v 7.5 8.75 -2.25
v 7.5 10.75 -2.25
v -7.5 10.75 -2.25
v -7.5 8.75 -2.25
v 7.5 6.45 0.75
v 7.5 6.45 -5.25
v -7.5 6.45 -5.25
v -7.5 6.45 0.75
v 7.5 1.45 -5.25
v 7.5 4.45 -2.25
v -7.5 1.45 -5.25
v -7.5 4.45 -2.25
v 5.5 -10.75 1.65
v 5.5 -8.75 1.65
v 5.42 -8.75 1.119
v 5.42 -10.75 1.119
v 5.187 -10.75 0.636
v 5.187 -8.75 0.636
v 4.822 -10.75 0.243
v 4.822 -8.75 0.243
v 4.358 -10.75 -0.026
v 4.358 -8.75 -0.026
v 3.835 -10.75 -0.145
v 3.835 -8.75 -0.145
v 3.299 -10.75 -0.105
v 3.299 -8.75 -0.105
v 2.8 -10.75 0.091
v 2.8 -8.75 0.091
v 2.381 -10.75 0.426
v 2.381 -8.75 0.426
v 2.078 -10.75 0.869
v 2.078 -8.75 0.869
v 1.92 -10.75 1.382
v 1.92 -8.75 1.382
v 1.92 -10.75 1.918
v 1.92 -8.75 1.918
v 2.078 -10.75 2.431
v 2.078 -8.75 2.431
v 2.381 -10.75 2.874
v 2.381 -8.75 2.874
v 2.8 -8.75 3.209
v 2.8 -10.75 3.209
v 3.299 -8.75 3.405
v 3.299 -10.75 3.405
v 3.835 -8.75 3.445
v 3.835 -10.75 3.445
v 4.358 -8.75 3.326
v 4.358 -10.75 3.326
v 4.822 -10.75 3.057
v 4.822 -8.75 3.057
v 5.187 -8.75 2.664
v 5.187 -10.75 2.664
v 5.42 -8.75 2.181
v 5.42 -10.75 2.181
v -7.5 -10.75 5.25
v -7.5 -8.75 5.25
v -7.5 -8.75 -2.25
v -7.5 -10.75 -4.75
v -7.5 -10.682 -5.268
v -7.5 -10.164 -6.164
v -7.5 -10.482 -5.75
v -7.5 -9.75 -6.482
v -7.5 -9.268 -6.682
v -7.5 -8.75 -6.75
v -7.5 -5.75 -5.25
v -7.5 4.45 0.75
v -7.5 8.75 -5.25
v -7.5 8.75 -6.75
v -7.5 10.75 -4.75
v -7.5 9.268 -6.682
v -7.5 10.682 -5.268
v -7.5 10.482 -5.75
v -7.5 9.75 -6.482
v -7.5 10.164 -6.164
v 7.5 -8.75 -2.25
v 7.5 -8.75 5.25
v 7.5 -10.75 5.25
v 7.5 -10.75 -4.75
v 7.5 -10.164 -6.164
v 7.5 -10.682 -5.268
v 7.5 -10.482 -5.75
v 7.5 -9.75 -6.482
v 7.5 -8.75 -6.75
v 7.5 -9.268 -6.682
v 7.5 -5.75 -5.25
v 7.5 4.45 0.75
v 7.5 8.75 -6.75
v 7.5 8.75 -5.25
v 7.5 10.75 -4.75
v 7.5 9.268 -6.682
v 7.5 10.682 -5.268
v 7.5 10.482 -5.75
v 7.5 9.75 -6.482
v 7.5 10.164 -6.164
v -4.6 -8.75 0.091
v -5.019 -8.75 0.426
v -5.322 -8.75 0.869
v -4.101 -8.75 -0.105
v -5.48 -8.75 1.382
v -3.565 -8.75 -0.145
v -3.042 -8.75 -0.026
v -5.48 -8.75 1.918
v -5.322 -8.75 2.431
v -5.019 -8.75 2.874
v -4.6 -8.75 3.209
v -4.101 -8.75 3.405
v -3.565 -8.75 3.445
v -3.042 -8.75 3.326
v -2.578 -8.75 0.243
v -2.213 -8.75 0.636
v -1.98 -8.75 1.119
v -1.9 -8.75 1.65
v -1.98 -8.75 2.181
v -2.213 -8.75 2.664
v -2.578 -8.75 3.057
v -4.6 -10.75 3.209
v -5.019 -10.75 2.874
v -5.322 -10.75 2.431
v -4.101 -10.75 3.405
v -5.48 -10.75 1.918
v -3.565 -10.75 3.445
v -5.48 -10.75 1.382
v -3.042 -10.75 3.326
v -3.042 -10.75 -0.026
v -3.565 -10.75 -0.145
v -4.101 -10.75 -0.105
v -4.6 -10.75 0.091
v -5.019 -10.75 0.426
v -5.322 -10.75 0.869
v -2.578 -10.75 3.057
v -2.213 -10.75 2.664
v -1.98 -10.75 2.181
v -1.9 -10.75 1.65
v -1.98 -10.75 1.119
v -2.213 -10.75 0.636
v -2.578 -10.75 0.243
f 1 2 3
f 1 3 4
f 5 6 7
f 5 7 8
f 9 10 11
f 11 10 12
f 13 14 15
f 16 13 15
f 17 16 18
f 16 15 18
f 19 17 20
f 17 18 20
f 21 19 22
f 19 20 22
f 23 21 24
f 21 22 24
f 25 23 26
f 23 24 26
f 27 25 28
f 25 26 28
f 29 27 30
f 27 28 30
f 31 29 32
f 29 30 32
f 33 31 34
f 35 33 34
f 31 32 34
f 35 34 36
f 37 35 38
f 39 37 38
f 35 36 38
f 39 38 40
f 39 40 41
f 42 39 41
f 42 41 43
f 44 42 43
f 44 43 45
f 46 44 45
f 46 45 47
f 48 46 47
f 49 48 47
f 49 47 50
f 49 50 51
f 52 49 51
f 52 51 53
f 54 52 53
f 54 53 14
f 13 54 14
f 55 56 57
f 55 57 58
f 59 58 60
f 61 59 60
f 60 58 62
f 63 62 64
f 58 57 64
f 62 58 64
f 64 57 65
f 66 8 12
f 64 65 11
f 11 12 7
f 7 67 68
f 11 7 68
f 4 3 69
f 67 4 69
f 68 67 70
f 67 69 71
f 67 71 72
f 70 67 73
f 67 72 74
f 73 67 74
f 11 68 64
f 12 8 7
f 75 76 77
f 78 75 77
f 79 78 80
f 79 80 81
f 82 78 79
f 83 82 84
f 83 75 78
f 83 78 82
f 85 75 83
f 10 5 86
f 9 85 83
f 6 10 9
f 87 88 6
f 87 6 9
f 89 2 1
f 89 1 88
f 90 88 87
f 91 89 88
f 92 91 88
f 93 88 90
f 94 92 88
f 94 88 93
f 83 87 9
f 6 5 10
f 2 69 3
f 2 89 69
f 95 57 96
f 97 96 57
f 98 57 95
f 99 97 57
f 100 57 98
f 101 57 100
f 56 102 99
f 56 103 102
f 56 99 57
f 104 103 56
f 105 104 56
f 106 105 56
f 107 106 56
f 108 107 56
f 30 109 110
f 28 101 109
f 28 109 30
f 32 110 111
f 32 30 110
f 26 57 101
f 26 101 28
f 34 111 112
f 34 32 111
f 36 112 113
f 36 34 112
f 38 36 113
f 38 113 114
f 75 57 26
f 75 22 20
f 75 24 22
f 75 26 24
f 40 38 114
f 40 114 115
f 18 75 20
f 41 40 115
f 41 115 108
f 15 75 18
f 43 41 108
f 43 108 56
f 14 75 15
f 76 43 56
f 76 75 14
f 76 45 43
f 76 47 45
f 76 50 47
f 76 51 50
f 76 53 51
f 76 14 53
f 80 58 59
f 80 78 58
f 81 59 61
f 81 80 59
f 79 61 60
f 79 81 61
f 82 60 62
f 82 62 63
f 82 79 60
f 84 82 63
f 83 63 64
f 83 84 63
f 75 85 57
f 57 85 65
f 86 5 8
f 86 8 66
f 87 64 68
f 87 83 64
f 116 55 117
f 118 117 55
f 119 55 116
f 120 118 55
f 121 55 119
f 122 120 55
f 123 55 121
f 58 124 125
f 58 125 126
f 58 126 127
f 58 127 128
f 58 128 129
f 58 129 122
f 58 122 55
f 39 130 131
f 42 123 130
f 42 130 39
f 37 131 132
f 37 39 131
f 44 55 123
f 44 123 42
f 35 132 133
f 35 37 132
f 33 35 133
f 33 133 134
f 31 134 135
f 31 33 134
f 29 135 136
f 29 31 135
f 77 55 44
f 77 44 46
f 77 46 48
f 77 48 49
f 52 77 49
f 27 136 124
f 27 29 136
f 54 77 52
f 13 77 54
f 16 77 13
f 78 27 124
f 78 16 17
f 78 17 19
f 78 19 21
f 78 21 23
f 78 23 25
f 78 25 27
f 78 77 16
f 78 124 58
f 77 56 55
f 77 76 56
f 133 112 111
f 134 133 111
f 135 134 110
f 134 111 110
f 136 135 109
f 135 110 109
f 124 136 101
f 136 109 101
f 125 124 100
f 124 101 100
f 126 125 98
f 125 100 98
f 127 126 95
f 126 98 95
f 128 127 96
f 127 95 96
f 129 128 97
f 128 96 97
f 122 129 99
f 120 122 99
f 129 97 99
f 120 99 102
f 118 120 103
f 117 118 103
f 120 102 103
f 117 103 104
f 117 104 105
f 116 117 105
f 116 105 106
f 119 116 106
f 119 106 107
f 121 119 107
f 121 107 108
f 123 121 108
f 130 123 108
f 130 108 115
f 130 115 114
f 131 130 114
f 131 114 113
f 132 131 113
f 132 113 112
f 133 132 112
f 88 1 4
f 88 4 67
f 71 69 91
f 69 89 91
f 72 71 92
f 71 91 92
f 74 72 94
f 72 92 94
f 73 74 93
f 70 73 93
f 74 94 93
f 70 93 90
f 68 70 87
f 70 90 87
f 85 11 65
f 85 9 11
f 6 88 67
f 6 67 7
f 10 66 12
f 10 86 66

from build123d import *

# Parameters (mm, degrees)
BOSS_EXTRUDE1_DEPTH     = 7.5
CHAMFER1_SIZE           = 3
SKETCH2_R               = 1.8
CUT_EXTRUDE1_DEPTH      = 3
CUT_EXTRUDE1_DEPTH_BACK = 3
FILLET1_R               = 2


with BuildPart() as part:
    # Sketch1 → Boss-Extrude1 (new body, symmetric)
    with BuildSketch(Plane(origin=(0, 0, 0), x_dir=(0, 0, -1), z_dir=(1, 0, 0))):
        Polygon((-5.25, -8.75), (-5.25, -10.75), (6.75, -10.75), (6.75, 10.75), (2.25, 10.75), (2.25, 8.75), (5.25, 8.75), (5.25, 6.45), (-0.75, 6.45), (-0.75, 4.45), (5.25, 4.45), (5.25, -8.75), align=None)
    extrude(amount=BOSS_EXTRUDE1_DEPTH, both=True)

    # Chamfer1
    chamfer1_edges = [part.edges().sort_by_distance(p)[0] for p in [
        (0, -8.75, -5.25),
        (0, 4.45, -5.25),
    ]]
    chamfer(chamfer1_edges, length=CHAMFER1_SIZE)

    # Sketch2 → Cut-Extrude1 (cut, two sides)
    with BuildSketch(Plane(origin=(0, -8.75, 0), x_dir=(1, 0, 0), z_dir=(0, 1, 0))) as cut_extrude1_sk:
        with Locations((-3.7, -1.65)):
            Circle(SKETCH2_R)
        with Locations((3.7, -1.65)):
            Circle(SKETCH2_R)
    extrude(amount=CUT_EXTRUDE1_DEPTH, mode=Mode.SUBTRACT)
    extrude(cut_extrude1_sk.sketch, amount=-CUT_EXTRUDE1_DEPTH_BACK, mode=Mode.SUBTRACT)

    # Fillet1
    fillet1_edges = [part.edges().sort_by_distance(p)[0] for p in [
        (0, 10.75, -6.75),
        (0, -10.75, -6.75),
    ]]
    fillet(fillet1_edges, radius=FILLET1_R)


solid = part.part
